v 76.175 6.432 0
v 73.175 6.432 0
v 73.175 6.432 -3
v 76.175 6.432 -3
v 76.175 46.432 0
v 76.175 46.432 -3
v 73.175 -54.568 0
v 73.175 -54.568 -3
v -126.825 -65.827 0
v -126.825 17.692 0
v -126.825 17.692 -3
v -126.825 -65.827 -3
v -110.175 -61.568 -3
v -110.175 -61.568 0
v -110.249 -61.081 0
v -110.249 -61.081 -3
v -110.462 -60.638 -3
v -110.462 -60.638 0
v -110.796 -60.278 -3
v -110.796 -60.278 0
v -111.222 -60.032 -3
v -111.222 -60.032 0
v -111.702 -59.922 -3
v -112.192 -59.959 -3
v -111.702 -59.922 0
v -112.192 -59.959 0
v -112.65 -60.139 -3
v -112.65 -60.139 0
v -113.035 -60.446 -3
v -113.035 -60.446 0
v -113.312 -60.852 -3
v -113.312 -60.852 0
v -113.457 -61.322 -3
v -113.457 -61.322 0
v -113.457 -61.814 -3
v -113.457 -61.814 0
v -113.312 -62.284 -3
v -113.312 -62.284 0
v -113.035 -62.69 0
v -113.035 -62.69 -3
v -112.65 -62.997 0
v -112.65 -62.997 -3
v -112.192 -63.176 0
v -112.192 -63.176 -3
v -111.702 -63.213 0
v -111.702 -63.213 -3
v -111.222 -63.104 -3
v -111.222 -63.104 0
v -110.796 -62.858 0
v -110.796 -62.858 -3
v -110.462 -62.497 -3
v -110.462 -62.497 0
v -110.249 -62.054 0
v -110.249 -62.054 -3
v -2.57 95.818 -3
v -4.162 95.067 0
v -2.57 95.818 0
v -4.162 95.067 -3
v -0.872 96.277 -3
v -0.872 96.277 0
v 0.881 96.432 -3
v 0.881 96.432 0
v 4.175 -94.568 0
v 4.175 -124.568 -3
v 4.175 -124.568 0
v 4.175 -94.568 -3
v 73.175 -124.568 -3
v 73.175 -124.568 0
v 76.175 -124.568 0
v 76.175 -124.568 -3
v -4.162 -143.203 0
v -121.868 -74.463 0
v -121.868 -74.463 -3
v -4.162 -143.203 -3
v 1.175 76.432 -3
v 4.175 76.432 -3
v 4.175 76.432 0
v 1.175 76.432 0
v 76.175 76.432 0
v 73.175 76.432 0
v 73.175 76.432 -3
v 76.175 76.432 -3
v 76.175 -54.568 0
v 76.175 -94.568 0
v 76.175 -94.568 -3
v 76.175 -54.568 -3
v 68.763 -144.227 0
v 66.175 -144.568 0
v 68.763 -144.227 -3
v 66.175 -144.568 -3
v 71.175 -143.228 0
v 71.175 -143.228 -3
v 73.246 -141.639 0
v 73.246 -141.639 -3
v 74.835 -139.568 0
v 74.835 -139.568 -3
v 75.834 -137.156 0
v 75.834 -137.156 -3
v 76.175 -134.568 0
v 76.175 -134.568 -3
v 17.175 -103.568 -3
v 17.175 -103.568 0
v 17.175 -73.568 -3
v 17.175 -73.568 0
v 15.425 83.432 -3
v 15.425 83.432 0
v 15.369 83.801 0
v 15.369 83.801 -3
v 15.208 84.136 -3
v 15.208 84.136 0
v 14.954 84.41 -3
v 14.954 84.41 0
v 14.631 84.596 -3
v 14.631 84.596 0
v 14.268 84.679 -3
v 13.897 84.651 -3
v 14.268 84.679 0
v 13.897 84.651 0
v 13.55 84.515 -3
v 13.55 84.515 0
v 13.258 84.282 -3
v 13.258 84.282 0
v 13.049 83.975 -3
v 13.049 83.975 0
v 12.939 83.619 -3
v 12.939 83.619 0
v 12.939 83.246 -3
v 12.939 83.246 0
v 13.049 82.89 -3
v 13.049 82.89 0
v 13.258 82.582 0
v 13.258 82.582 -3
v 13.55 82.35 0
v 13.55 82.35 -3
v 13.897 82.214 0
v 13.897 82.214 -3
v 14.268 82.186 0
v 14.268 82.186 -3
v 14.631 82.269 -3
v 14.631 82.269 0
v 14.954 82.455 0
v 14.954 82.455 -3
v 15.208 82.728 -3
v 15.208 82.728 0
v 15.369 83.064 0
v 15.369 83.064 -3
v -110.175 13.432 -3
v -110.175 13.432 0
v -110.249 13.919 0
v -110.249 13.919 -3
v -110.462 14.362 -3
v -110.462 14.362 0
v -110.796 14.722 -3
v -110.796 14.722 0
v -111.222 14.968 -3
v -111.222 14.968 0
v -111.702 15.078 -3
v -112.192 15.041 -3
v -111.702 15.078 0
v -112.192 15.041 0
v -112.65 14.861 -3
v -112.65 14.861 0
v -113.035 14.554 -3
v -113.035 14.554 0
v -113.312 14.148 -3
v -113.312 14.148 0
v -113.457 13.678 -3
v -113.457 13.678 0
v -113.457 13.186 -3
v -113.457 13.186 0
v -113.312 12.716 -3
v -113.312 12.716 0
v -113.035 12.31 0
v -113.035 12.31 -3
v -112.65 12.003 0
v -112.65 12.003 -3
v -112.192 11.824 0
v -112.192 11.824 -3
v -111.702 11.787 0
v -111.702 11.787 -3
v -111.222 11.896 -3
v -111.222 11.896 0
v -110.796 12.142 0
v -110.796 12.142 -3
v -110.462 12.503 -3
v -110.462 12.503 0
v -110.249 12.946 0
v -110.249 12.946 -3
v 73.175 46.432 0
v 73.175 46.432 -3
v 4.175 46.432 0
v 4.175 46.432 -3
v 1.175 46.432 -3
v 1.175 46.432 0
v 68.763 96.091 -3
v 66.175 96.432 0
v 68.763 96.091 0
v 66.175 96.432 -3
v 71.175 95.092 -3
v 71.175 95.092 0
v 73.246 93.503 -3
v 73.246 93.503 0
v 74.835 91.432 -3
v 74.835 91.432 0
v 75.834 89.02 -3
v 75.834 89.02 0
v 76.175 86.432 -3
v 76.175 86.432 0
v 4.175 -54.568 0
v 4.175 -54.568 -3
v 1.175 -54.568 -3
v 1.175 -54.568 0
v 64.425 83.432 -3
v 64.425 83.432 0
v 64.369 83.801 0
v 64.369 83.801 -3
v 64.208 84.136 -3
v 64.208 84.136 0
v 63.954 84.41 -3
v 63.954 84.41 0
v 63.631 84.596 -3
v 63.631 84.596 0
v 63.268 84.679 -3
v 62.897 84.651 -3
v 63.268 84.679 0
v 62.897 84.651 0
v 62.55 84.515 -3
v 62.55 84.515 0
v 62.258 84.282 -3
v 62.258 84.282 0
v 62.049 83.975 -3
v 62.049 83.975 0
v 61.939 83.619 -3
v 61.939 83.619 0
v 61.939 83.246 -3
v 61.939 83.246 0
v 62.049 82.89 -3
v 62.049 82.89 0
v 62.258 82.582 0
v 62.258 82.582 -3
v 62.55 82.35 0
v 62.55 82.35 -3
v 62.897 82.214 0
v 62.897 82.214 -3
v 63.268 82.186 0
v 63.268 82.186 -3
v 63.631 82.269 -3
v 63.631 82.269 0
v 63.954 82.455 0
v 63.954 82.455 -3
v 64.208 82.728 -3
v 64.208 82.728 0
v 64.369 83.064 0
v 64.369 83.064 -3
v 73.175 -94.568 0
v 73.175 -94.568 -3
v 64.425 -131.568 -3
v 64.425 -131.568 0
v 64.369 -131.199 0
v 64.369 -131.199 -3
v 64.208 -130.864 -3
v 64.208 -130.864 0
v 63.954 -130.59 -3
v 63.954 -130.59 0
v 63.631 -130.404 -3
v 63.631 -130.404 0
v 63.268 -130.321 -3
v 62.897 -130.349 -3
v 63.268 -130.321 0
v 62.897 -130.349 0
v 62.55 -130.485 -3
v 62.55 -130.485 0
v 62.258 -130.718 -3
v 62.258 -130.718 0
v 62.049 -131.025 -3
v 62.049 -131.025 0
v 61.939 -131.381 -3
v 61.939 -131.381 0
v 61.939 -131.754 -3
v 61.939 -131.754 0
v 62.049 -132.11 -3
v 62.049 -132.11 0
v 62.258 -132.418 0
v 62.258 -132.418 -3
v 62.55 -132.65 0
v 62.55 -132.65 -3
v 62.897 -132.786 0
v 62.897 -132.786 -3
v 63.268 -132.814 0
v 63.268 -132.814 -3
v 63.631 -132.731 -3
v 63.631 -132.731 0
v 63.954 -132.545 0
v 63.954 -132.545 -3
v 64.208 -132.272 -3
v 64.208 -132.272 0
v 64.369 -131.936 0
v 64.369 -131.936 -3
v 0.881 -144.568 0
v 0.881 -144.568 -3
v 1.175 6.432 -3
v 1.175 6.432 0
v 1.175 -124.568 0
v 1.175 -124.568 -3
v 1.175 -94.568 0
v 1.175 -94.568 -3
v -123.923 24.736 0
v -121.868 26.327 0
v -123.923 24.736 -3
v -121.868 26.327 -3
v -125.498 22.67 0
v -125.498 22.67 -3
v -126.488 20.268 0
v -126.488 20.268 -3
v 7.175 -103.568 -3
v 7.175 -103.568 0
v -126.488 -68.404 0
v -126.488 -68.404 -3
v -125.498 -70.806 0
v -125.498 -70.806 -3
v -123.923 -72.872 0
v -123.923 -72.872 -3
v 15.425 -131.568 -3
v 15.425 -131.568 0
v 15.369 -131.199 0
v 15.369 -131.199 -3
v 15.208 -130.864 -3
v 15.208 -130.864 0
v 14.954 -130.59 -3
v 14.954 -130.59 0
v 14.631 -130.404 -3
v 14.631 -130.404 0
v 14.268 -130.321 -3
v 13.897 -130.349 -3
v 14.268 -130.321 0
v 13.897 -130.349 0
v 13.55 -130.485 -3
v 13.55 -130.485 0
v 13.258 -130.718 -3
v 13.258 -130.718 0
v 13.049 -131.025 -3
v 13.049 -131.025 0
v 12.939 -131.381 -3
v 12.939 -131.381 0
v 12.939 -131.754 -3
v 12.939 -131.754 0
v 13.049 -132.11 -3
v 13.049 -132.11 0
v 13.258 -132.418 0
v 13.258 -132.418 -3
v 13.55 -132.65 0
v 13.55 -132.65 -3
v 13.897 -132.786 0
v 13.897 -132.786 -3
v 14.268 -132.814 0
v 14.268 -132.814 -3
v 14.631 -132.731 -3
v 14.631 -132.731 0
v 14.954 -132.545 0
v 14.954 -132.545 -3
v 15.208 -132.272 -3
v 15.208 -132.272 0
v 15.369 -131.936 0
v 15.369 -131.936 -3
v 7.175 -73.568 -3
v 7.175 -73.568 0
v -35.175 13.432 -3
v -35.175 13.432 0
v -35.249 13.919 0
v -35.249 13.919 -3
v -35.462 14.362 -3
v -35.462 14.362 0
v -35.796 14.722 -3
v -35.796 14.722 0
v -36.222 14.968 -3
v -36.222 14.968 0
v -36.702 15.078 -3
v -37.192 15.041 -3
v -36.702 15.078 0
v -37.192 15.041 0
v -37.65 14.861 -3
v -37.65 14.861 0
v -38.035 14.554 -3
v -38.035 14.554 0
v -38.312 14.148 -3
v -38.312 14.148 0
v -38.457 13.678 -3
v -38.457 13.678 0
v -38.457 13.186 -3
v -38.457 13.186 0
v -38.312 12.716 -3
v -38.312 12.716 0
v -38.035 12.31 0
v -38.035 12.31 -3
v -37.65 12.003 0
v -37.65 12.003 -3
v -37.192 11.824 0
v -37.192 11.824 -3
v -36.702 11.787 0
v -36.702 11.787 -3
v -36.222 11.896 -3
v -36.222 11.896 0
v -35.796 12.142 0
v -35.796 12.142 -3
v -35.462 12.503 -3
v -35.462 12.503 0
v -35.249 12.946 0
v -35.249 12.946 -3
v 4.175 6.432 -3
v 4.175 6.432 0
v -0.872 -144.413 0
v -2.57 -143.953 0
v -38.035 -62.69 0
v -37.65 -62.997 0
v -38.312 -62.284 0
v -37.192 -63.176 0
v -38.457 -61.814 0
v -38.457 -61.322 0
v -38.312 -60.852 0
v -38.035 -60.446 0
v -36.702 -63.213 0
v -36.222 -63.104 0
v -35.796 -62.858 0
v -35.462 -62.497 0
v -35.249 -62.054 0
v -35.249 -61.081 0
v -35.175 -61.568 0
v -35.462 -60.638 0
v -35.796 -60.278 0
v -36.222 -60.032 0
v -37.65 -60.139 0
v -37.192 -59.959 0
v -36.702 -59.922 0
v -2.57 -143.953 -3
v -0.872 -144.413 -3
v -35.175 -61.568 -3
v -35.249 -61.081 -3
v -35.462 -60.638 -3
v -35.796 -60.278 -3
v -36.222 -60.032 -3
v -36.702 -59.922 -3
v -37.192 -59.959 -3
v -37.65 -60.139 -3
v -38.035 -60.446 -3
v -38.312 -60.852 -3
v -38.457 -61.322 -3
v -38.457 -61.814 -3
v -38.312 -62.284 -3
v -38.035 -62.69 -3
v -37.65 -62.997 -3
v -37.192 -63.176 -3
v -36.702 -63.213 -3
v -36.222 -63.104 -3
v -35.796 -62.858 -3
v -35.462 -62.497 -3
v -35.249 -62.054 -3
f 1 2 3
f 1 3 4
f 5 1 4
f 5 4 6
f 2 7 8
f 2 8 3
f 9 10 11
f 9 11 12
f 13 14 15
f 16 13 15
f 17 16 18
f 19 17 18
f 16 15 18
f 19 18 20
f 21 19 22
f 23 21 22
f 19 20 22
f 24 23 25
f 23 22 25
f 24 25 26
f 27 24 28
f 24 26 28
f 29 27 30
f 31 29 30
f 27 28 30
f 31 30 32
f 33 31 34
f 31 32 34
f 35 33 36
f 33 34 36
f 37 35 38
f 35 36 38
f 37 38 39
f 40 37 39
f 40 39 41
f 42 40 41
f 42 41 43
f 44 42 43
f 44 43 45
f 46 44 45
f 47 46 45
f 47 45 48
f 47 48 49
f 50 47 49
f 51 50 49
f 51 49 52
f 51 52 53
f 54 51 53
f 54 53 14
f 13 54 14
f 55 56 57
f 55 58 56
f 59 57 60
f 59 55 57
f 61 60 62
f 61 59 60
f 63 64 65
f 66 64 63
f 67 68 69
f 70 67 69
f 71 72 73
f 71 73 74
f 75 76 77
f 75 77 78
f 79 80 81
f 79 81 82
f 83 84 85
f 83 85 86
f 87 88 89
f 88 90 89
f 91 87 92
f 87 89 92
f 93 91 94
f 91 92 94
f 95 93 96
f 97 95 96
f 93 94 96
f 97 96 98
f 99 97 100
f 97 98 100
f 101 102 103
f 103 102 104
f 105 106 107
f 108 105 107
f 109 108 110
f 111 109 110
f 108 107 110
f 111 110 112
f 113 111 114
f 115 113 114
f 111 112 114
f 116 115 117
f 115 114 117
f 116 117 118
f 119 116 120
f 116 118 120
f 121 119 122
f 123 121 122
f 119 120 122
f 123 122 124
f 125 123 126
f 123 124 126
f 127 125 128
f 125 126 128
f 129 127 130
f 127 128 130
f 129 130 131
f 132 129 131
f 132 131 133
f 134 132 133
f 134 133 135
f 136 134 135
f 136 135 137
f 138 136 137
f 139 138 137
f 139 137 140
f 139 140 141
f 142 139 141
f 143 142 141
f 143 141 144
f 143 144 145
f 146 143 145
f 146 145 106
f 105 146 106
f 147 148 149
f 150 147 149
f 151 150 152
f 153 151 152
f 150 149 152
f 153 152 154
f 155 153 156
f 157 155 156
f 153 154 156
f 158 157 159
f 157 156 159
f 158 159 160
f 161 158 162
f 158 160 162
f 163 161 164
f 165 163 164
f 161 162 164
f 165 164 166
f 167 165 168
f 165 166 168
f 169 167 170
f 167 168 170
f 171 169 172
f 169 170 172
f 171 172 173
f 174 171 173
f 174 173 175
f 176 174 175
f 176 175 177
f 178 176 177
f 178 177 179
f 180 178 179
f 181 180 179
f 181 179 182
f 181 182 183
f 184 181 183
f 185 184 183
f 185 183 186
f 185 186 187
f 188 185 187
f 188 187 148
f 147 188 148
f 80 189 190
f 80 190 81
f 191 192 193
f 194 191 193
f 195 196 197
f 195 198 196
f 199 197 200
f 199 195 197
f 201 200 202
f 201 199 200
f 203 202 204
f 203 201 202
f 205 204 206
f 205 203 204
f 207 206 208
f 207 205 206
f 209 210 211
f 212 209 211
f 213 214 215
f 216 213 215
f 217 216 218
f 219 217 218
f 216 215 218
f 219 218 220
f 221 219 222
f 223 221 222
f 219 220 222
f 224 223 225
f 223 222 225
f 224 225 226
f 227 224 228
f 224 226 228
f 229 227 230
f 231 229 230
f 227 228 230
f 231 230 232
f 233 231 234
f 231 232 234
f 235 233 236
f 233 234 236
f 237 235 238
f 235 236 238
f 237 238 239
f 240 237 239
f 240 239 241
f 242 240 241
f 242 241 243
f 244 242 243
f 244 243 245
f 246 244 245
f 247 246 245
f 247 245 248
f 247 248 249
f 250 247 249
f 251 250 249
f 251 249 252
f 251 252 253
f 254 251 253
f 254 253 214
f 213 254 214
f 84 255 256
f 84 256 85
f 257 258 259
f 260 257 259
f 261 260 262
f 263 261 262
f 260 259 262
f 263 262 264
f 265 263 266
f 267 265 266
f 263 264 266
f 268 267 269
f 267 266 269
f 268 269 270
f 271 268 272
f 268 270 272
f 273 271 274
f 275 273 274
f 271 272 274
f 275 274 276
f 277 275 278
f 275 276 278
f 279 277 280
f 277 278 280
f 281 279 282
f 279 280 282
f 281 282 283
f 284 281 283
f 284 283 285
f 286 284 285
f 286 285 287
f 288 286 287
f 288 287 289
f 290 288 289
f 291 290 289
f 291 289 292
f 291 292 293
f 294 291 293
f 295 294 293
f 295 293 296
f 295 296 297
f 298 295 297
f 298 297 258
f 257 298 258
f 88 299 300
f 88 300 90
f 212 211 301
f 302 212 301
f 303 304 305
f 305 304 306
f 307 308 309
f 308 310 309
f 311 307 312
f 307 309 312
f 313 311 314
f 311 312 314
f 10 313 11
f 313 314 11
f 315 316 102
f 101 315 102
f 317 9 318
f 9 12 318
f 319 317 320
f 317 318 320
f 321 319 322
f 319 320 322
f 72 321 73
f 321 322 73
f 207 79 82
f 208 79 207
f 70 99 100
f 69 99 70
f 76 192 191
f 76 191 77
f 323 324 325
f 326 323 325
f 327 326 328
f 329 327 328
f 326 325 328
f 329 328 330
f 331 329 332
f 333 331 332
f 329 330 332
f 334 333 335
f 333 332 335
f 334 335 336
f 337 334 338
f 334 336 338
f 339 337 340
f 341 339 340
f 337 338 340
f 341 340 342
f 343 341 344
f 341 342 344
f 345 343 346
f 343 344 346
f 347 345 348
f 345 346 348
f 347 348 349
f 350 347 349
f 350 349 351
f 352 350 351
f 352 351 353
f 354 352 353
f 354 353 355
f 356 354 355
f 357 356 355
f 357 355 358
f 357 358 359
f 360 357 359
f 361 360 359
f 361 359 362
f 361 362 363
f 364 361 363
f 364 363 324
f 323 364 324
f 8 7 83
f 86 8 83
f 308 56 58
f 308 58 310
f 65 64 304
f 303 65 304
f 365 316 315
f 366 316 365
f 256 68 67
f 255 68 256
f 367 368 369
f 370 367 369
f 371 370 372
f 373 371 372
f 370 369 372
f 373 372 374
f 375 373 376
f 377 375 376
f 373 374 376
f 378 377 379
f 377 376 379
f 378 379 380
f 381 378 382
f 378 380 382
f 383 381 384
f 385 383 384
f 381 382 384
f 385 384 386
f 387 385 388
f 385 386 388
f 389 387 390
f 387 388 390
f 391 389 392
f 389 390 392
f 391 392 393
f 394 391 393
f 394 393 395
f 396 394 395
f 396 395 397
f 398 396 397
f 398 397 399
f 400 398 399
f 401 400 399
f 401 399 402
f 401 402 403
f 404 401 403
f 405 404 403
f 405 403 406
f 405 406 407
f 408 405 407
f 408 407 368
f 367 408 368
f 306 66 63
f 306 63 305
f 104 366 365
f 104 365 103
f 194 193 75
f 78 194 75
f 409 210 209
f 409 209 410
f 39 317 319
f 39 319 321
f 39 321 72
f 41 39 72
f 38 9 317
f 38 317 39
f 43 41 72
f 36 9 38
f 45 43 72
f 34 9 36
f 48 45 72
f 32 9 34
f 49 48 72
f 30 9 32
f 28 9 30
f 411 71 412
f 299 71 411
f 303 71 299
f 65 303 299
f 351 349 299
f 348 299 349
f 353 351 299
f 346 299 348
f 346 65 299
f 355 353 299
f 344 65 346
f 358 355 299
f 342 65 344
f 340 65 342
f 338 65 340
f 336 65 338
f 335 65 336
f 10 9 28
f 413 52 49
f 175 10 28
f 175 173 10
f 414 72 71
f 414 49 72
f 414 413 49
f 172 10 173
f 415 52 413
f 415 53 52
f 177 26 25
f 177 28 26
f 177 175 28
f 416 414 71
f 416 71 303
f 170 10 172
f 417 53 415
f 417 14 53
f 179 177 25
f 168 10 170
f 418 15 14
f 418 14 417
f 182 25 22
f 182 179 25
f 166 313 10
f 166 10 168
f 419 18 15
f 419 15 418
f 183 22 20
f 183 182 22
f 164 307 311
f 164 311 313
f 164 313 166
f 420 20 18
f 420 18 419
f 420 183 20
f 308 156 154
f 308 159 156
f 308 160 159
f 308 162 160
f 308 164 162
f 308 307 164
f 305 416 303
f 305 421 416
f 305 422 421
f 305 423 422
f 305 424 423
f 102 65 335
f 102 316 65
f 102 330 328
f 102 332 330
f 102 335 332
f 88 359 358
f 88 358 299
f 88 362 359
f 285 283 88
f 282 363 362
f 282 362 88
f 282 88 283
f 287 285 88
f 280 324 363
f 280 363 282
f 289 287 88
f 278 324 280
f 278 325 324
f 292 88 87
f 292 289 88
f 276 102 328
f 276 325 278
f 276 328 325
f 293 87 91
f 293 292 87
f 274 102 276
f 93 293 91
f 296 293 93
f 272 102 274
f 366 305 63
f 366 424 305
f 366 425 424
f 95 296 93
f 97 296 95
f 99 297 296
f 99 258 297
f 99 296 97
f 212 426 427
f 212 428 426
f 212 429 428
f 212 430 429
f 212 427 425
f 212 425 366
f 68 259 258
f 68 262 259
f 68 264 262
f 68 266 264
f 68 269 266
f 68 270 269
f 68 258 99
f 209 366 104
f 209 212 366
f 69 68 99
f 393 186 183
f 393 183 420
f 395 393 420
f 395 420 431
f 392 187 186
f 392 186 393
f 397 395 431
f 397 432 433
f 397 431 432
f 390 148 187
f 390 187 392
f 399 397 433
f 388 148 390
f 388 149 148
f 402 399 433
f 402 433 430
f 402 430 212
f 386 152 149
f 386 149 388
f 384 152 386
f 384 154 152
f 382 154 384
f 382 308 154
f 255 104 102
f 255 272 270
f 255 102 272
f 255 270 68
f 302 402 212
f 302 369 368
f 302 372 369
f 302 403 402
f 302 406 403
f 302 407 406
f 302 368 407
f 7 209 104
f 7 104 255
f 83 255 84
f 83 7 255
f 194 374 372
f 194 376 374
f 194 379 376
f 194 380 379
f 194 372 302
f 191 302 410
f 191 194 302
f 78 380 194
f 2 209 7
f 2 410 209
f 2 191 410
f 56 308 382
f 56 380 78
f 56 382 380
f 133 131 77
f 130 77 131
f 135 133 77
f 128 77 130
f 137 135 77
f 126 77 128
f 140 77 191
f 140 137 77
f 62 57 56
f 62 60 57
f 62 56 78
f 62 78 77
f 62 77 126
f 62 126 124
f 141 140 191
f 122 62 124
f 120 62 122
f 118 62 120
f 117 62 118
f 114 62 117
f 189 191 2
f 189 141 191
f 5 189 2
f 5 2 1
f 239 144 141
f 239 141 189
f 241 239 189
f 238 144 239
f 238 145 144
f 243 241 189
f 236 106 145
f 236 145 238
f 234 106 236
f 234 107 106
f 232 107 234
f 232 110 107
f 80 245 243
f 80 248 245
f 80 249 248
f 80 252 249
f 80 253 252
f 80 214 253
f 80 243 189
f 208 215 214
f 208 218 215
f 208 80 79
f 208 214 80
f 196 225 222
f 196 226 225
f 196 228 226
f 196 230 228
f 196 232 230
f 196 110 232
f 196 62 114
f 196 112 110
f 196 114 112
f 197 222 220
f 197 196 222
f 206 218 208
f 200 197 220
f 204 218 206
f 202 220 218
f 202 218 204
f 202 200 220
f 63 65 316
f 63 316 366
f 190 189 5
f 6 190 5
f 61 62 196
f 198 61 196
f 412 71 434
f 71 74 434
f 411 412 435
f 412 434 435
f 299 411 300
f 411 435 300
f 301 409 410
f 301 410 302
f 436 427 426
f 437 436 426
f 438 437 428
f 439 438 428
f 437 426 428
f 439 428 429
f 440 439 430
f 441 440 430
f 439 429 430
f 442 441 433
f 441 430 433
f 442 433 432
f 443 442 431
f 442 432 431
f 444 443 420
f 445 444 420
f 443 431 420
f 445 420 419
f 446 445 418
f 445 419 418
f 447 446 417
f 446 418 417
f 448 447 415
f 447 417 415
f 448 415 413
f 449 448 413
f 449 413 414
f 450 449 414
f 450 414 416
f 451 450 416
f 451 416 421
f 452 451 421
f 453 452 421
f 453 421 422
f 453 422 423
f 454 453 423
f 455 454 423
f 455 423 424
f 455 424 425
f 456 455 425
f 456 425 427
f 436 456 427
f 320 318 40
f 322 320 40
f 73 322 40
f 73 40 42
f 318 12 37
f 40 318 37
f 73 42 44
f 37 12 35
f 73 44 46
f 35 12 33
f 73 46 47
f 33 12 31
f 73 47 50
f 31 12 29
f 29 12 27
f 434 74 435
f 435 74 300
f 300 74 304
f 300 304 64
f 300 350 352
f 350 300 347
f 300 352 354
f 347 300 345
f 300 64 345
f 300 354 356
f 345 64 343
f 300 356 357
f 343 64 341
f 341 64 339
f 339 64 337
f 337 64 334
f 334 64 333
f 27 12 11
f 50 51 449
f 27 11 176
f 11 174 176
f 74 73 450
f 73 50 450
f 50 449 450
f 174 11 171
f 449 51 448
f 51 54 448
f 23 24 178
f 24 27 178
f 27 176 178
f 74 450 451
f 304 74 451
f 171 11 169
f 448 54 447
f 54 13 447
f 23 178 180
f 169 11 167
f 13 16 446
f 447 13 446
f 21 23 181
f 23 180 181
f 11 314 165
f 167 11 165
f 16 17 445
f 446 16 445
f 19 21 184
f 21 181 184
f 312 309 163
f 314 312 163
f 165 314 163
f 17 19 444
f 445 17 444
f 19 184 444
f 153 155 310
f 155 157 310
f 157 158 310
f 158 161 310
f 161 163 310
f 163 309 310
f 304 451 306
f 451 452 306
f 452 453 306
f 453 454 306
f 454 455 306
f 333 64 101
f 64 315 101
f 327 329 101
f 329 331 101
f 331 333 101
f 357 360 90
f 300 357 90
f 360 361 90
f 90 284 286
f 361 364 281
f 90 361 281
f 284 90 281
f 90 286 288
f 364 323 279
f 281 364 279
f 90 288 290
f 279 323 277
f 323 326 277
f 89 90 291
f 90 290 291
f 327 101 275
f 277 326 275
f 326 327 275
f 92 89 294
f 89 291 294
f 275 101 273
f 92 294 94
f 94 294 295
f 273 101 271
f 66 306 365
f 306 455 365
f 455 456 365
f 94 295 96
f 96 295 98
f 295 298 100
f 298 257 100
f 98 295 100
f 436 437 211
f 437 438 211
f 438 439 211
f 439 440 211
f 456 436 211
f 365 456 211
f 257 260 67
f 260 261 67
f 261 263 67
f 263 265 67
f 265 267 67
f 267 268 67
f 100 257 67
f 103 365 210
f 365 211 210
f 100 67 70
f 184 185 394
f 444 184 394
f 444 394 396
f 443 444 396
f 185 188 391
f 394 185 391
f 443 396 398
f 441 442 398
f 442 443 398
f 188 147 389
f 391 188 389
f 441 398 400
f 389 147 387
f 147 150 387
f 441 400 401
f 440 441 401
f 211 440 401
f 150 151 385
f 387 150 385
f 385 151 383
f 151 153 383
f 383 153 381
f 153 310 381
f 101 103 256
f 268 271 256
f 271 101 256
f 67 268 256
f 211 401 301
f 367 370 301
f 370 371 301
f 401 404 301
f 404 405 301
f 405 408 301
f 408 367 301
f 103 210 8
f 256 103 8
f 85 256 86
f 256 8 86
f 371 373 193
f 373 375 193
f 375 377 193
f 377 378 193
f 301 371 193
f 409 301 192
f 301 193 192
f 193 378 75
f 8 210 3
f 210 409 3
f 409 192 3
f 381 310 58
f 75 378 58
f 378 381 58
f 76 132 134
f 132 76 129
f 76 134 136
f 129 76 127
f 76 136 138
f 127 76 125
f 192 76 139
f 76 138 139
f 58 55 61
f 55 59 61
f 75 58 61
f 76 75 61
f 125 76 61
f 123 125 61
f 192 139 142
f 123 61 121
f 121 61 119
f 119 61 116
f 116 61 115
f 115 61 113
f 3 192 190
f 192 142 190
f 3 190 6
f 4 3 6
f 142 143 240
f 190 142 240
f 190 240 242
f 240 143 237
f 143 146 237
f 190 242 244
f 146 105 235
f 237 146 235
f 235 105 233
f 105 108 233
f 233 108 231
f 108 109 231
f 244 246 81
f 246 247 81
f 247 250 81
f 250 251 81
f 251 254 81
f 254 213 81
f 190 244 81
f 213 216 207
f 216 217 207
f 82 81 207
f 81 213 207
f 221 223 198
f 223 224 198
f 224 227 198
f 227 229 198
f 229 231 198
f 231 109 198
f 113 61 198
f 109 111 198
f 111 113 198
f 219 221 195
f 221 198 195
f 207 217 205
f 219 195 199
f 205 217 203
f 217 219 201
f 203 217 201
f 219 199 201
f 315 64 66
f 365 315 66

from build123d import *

# Parameters (mm, degrees)
SKETCH_1_W          = 78
SKETCH_1_H          = 241
EXTRUDE_1_DEPTH     = 3
EXTRUDE_2_DEPTH     = 3
SKETCH_5_W          = 3
SKETCH_5_H          = 30
SKETCH_5_H_2        = 61
CUT_EXTRUDE_3_DEPTH = 3
SKETCH_6_W          = 3
SKETCH_6_H          = 30
SKETCH_6_H_2        = 61
CUT_EXTRUDE_4_DEPTH = 3
SKETCH_7_W          = 10
SKETCH_7_H          = 30
CUT_EXTRUDE_5_DEPTH = 3
FILLET_1_R          = 10
HOLE_WIZARD_M4_1_D  = 3.3
HOLE_WIZARD_M3_2_D  = 2.5


with BuildPart() as part:
    # 草图1 → 凸台-拉伸1 (new body)
    with BuildSketch(Plane.XY):
        with Locations((37.174772521, -24.067785913)):
            Rectangle(SKETCH_1_W, SKETCH_1_H)
    extrude(amount=-EXTRUDE_1_DEPTH)

    # 草图2 → 凸台-拉伸2 (add)
    with BuildSketch(Plane.XY):
        Polygon((-1.825227479, 96.432214087), (-126.825227479, 23.432214087), (-126.825227479, -71.567785913), (-1.825227479, -144.567785913), align=None)
    extrude(amount=-EXTRUDE_2_DEPTH)

    # 草图5 → 切除-拉伸3 (cut)
    with BuildSketch(Plane.XY):
        with Locations((74.674772521, 61.432214087)):
            Rectangle(SKETCH_5_W, SKETCH_5_H)
        with Locations((74.674772521, -109.567785913)):
            Rectangle(SKETCH_5_W, SKETCH_5_H)
        with Locations((74.674772521, -24.067785913)):
            Rectangle(SKETCH_5_W, SKETCH_5_H_2)
    extrude(amount=-CUT_EXTRUDE_3_DEPTH, mode=Mode.SUBTRACT)

    # 草图6 → 切除-拉伸4 (cut)
    with BuildSketch(Plane(origin=(0, 0, -3), x_dir=(-1, 0, 0), z_dir=(0, 0, -1))):
        with Locations((-2.674772521, 61.432214087)):
            Rectangle(SKETCH_6_W, SKETCH_6_H)
        with Locations((-2.674772521, -24.067785913)):
            Rectangle(SKETCH_6_W, SKETCH_6_H_2)
        with Locations((-2.674772521, -109.567785913)):
            Rectangle(SKETCH_6_W, SKETCH_6_H)
    extrude(amount=-CUT_EXTRUDE_4_DEPTH, mode=Mode.SUBTRACT)

    # 草图7 → 切除-拉伸5 (cut)
    with BuildSketch(Plane.XY):
        with Locations((12.174772521, -88.567785913)):
            Rectangle(SKETCH_7_W, SKETCH_7_H)
    extrude(amount=-CUT_EXTRUDE_5_DEPTH, mode=Mode.SUBTRACT)

    # 圆角1
    fillet_1_edges = [part.edges().sort_by_distance(p)[0] for p in [
        (-126.825227479, -71.567785913, -1.5),
        (-126.825227479, 23.432214087, -1.5),
        (-1.825227479, 96.432214087, -1.5),
        (-1.825227479, -144.567785913, -1.5),
        (76.174772521, -144.567785913, -1.5),
        (76.174772521, 96.432214087, -1.5),
    ]]
    fillet(fillet_1_edges, radius=FILLET_1_R)

    # M4 螺纹孔的螺纹孔钻头1 (through all)
    with Locations(Plane(origin=(-111.825227479, 13.432214087, -3), x_dir=(-1, 0, 0), z_dir=(0, 0, -1))):
        with Locations((0, 0), (0, -75), (-75, -75), (-75, 0)):
            Hole(HOLE_WIZARD_M4_1_D / 2)

    # M3 螺纹孔的螺纹孔钻头2 (through all)
    with Locations(Plane(origin=(63.174772521, -131.567785913, -3), x_dir=(-1, 0, 0), z_dir=(0, 0, -1))):
        with Locations((0, 0), (49, 0), (0, 215), (49, 215)):
            Hole(HOLE_WIZARD_M3_2_D / 2)


solid = part.part
